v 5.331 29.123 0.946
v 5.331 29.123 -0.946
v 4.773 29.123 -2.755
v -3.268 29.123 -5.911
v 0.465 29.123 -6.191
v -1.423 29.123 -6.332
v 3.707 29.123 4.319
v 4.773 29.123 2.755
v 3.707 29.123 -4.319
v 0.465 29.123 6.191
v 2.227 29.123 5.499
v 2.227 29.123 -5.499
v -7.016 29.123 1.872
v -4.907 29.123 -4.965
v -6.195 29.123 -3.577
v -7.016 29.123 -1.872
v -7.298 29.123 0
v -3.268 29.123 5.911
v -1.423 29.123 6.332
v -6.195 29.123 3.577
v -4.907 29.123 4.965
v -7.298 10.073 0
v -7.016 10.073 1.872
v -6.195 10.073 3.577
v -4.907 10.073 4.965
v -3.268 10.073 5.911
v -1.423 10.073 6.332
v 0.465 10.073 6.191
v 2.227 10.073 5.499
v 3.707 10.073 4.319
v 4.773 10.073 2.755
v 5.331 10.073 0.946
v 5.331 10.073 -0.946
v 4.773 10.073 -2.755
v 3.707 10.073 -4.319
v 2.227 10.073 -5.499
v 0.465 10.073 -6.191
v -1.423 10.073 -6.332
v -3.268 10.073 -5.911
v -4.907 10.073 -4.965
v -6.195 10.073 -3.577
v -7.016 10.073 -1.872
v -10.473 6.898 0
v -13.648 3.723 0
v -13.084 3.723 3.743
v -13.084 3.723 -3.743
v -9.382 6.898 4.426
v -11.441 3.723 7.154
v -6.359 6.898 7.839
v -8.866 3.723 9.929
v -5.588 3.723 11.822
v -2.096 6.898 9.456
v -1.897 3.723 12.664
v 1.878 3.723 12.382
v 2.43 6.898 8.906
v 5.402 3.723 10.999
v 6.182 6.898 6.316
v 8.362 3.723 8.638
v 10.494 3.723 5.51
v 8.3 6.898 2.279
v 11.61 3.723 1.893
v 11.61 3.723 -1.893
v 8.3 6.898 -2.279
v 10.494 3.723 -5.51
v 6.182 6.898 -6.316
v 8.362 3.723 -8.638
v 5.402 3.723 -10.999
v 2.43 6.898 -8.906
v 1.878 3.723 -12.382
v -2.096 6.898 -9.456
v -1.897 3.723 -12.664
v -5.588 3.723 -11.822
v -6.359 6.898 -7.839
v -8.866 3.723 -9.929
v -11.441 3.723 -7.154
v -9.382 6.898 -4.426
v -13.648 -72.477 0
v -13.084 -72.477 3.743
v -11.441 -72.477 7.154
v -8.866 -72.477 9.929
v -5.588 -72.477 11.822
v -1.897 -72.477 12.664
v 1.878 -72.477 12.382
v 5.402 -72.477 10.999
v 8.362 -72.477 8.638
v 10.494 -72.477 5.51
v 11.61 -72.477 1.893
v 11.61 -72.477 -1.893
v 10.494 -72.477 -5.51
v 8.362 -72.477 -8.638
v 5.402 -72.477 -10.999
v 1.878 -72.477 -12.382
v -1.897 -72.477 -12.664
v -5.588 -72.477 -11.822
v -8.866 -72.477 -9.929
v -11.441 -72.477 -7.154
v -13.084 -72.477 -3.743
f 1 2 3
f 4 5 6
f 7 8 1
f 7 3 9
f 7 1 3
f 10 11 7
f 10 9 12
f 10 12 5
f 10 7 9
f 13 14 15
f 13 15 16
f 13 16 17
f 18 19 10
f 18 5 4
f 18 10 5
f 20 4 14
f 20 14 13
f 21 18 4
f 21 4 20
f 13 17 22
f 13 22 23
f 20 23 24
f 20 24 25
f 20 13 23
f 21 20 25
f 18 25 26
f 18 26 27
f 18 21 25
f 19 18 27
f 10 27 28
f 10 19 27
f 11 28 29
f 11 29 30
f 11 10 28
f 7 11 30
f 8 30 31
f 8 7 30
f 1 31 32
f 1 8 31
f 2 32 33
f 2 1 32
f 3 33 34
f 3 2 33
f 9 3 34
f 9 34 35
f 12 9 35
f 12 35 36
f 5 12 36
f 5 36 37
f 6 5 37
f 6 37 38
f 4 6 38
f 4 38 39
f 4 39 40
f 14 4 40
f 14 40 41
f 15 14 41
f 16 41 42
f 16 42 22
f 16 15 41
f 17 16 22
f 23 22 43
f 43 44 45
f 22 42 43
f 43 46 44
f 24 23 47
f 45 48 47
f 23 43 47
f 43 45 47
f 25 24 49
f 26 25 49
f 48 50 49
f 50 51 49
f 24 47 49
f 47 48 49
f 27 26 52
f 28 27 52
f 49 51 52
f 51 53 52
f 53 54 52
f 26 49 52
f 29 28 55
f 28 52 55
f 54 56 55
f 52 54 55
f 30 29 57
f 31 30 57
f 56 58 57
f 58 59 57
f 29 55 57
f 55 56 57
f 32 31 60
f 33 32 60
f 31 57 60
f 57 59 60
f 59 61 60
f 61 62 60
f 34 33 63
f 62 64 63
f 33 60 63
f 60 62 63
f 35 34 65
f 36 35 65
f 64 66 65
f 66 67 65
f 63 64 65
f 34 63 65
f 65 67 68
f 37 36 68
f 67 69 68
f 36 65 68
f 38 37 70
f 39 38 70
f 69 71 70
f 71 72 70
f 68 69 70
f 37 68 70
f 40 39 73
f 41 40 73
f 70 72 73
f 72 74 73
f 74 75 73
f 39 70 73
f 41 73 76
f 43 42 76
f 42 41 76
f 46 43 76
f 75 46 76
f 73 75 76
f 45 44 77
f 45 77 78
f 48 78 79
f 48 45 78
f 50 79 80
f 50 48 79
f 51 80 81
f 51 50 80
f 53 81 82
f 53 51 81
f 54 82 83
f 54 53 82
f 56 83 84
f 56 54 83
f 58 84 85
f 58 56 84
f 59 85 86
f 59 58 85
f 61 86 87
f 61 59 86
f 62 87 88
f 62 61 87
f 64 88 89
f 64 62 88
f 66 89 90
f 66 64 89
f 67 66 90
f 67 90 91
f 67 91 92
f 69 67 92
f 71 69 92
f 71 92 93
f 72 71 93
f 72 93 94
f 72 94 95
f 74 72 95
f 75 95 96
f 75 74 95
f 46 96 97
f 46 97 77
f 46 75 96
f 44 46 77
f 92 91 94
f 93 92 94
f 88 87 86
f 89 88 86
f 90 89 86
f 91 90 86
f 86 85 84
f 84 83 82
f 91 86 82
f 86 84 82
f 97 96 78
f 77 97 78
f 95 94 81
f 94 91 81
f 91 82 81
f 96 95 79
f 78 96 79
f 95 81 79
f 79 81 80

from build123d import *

# Parameters (mm, degrees)
F0_W   = 12.7
F0_H   = 76.2
F0_W_2 = 6.35
F0_H_2 = 19.05


with BuildPart() as f1:
    # F0 (on Top) → F1 (revolve)
    with BuildSketch(Plane.XY):
        with Locations((-7.297987, -34.377149)):
            Rectangle(F0_W, F0_H)
    revolve(axis=Axis((-0.947987, -34.377149, 0), (0, 1, 0)))

    # F0 (on Top) → F2 (revolve)
    with BuildSketch(Plane.XY):
        Polygon((-7.297987, 10.072851), (-13.647987, 3.722851), (-0.947987, 3.722851), (-0.947987, 10.072851), align=None)
    revolve(axis=Axis((-0.947987, 16.422851, 0), (0, 1, 0)))

    # F0 (on Top) → F3 (revolve)
    with BuildSketch(Plane.XY):
        with Locations((-4.122987, 19.597851)):
            Rectangle(F0_W_2, F0_H_2)
    revolve(axis=Axis((-0.947987, 16.422851, 0), (0, 1, 0)))


solid = f1.part
